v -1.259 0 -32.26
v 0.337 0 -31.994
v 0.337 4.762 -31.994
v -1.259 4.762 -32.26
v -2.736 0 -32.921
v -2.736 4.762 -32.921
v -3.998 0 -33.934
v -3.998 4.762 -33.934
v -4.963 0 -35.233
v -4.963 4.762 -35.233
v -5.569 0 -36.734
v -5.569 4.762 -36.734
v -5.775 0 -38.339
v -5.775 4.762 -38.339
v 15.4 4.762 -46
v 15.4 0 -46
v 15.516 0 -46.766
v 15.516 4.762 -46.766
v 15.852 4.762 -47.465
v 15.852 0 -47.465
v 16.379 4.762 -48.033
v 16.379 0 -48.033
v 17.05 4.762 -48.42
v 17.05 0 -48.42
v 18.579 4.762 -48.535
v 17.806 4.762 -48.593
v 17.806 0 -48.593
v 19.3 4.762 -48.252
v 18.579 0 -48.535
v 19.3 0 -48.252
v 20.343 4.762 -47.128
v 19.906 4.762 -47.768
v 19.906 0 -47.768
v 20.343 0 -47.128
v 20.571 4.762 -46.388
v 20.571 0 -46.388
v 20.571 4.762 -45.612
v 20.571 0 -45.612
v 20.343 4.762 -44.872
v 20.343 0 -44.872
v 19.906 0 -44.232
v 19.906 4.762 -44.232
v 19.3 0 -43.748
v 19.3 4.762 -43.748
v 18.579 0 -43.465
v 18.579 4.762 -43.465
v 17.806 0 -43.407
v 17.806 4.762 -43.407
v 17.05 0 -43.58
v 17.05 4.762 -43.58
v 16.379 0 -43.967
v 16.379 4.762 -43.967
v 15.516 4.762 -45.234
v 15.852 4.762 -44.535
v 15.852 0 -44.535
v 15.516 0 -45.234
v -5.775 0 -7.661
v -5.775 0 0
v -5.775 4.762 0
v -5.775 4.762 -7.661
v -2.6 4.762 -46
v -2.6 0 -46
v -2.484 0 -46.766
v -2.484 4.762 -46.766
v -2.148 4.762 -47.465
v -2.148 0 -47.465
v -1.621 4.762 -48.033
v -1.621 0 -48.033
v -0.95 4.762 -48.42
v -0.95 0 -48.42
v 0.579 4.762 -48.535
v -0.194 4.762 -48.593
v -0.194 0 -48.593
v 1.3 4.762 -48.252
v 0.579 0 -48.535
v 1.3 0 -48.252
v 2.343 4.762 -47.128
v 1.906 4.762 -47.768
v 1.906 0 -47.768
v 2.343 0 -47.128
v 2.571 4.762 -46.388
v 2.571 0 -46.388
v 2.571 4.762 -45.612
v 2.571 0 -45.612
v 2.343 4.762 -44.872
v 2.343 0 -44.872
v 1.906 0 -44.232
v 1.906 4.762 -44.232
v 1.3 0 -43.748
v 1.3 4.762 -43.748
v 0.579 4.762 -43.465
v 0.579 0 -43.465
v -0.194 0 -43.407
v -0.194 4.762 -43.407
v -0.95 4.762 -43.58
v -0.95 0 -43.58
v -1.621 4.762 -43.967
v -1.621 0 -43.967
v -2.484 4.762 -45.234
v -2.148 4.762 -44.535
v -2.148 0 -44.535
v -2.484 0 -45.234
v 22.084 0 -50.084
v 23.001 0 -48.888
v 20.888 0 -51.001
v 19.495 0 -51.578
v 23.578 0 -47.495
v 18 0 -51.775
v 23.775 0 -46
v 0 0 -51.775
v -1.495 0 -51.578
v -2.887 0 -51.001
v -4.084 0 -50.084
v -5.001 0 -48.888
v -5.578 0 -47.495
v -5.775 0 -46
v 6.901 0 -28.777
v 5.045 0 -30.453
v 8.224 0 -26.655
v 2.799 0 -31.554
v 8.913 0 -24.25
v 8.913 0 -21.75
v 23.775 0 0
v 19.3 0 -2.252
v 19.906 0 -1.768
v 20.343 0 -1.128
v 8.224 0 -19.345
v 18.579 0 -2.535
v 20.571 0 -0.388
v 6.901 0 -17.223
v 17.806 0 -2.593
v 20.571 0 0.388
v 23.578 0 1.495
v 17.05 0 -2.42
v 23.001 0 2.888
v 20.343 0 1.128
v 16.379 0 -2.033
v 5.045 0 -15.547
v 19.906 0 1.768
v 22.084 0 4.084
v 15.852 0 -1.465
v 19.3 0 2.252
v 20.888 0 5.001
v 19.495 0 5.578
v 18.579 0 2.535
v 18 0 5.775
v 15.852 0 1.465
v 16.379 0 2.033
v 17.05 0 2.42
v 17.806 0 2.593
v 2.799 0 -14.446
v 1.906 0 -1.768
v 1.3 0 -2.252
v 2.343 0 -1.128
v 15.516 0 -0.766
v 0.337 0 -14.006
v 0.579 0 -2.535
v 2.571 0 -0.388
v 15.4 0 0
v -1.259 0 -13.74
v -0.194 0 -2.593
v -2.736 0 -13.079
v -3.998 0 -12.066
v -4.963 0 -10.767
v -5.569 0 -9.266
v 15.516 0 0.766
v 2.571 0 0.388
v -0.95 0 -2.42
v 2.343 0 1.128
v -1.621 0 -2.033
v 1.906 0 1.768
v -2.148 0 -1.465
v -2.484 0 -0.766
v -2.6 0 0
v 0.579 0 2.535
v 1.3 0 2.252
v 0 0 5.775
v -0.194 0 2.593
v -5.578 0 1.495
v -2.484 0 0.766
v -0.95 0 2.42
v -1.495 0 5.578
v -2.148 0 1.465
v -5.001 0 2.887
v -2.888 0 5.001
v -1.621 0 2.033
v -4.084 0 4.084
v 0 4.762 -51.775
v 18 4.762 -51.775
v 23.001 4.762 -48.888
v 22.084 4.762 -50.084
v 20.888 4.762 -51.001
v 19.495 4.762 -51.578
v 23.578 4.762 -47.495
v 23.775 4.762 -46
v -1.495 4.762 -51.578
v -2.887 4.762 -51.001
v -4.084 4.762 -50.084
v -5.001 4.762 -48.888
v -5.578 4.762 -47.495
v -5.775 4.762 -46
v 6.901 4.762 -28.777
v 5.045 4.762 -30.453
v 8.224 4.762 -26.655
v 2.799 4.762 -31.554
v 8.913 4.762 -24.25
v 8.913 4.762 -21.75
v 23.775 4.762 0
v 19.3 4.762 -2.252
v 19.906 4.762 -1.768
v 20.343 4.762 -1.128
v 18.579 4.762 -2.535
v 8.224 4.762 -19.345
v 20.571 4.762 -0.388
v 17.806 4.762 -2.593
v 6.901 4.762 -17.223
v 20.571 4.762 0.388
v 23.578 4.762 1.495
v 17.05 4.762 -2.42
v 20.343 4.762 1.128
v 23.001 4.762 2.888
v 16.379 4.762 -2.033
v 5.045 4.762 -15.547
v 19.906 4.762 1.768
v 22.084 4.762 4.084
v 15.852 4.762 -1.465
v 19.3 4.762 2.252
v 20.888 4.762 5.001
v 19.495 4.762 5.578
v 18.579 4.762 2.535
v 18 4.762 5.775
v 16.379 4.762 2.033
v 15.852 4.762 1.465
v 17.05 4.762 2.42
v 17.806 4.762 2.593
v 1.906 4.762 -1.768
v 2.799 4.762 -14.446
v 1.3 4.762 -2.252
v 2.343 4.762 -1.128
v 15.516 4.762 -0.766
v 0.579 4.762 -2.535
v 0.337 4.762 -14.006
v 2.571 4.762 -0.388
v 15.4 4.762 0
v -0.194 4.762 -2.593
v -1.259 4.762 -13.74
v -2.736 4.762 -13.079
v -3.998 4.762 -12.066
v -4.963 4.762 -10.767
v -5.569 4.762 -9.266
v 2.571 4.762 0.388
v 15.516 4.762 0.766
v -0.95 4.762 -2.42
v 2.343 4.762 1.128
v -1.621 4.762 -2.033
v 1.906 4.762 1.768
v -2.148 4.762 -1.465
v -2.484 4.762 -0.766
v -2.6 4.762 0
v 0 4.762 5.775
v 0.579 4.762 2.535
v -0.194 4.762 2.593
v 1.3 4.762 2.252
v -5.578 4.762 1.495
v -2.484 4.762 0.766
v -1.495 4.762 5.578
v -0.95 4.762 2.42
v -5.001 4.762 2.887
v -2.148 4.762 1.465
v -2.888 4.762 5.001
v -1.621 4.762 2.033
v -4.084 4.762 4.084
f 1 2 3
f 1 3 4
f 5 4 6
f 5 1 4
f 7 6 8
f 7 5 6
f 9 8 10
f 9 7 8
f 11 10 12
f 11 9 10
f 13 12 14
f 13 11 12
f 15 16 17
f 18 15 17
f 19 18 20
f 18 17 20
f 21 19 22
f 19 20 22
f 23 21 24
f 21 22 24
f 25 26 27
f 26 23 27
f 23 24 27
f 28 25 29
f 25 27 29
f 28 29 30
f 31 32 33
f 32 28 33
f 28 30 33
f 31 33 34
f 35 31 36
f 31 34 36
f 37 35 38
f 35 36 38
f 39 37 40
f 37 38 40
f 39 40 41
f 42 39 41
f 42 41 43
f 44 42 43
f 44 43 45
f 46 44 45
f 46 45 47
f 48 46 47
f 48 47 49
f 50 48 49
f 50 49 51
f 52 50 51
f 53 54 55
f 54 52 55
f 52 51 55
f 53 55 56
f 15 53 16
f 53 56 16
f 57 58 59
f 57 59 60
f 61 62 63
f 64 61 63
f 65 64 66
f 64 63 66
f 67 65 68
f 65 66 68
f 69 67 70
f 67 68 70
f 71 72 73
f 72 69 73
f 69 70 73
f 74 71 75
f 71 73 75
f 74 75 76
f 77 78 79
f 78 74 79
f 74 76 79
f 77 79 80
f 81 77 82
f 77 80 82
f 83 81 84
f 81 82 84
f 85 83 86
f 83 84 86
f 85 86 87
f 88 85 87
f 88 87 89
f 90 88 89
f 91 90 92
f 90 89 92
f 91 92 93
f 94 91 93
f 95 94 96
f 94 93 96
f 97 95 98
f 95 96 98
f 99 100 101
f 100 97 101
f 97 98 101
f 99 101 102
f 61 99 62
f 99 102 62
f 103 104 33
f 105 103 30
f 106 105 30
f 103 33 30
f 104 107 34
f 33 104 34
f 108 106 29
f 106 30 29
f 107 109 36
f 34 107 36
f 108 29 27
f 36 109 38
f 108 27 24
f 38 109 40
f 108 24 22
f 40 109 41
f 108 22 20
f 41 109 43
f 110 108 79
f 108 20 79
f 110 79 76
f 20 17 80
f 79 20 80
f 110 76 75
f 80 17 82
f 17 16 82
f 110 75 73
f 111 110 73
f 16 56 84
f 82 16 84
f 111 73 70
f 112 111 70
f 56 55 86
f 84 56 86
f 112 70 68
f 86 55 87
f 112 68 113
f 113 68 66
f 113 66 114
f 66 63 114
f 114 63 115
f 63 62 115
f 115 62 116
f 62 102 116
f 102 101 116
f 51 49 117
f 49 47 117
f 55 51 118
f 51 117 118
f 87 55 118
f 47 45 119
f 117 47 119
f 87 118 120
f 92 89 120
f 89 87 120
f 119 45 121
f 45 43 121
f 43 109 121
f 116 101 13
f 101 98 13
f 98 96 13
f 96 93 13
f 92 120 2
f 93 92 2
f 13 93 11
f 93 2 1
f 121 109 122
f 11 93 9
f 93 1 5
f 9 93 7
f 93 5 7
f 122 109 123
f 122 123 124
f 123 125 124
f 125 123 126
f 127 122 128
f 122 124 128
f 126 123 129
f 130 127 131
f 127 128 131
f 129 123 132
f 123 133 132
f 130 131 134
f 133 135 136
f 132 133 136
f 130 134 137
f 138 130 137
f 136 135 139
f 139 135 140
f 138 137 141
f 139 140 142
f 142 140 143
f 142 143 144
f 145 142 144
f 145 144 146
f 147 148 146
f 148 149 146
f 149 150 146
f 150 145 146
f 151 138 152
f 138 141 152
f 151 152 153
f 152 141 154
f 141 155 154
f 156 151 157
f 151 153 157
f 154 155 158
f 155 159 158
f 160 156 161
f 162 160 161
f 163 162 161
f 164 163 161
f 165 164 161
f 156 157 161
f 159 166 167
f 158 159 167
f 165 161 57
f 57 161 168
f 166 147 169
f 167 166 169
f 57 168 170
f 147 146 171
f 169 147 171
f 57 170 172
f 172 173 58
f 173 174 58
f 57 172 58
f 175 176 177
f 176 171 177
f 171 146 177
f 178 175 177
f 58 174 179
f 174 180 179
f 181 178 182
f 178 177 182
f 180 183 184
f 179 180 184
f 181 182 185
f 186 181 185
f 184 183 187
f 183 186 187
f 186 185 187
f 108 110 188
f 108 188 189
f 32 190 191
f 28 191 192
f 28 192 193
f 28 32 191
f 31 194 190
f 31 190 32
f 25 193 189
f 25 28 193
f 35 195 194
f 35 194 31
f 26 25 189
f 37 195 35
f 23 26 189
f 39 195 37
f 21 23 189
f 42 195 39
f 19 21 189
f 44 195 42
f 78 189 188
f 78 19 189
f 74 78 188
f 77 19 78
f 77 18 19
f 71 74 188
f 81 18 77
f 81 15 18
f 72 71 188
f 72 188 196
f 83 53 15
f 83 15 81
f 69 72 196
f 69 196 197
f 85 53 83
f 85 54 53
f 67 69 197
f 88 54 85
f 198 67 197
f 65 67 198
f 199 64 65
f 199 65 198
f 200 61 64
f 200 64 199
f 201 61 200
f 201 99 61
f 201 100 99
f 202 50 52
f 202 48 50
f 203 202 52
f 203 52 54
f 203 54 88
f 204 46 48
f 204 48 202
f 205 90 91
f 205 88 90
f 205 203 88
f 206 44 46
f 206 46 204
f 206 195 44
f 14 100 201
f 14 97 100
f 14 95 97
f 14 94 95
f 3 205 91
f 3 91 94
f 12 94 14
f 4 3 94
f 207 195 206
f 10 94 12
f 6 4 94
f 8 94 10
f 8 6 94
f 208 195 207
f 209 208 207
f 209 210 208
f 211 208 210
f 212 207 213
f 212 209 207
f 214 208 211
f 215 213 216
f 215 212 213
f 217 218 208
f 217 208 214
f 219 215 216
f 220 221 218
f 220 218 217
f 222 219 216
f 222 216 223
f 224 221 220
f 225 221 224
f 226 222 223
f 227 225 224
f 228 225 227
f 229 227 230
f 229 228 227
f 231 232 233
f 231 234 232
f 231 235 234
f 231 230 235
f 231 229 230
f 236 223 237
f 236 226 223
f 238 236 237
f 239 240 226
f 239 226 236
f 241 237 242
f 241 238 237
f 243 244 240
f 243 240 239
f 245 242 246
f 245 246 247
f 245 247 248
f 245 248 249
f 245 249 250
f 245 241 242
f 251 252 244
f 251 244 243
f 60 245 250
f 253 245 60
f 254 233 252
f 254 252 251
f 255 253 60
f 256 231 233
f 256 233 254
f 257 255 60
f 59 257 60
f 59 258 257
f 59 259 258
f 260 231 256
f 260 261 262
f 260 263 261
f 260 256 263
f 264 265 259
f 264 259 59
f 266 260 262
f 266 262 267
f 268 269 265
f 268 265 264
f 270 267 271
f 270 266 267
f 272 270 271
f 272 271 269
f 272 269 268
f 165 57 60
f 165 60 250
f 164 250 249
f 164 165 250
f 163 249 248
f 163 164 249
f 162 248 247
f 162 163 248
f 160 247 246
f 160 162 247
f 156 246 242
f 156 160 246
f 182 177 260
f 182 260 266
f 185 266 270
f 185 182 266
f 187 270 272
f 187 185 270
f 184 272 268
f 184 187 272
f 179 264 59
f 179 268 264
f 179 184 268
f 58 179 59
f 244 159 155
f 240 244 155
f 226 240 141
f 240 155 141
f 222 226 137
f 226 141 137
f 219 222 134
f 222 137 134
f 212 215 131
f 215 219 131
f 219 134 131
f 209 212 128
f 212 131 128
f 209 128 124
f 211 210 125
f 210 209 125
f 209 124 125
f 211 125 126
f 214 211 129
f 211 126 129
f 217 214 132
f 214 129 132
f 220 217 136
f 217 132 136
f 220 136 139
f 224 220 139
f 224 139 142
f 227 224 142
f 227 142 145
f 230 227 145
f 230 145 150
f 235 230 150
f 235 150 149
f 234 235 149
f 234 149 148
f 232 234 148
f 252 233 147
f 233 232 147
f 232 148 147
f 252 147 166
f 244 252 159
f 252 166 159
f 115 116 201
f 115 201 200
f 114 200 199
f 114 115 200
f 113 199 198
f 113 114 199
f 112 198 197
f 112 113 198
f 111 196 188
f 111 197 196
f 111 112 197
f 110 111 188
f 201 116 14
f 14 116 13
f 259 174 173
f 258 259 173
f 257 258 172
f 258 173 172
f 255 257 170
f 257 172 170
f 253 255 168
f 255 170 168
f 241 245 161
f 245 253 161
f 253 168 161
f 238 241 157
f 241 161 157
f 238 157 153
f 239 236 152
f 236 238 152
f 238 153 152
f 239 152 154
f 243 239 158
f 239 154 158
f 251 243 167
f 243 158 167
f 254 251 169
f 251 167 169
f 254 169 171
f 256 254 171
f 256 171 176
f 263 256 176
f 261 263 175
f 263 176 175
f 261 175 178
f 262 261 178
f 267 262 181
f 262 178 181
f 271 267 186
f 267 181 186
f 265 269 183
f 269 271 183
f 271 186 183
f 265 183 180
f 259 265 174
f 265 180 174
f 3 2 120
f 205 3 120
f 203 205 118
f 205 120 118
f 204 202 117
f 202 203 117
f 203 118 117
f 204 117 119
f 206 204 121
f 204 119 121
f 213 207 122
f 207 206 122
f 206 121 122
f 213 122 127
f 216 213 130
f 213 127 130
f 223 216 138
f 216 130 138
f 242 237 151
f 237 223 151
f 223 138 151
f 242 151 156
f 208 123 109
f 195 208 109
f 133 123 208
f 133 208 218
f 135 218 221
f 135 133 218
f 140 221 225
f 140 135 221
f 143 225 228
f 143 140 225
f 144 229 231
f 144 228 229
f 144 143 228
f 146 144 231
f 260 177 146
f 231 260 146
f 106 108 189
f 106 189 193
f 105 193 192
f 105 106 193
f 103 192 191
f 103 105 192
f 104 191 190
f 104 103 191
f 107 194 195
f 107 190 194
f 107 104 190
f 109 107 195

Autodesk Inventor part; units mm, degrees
ref_plane "YZ Plane" through (0, 0, 0) normal (1, 0, 0) x (0, 1, 0)
ref_plane "XZ Plane" through (0, 0, 0) normal (0, 1, 0) x (-1, 0, 0)
ref_plane "XY Plane" through (0, 0, 0) normal (0, 0, 1) x (1, 0, 0)
sketch "Sketch1" plane through (0, 0, 0) normal (0, 1, 0) x (-1, 0, 0)
  circle A0 centre (0, 0) radius 2.6
  circle A1 centre (-18, 0) radius 2.6
  circle A2 centre (0, -46) radius 2.6
  circle A3 centre (-18, -46) radius 2.6
  circle A4 centre (0, -23) radius 9 construction
  circle A5 centre (0, 0) radius 5.775 construction
  circle A6 centre (0, -46) radius 5.775 construction
  circle A7 centre (-18, -46) radius 5.775 construction
  circle A8 centre (-18, 0) radius 5.775 construction
  line L0 (5.775, 0) -> (5.775, -7.6608)
  line L1 (5.775, -46) -> (5.775, -38.3392)
  arc A9 (5.775, -38.3392) -> (-0.3371, -31.9937) centre (-0.575, -38.3392) ccw
  arc A10 (-0.3371, -14.0063) -> (5.775, -7.6608) centre (-0.575, -7.6608) ccw
  arc A11 (-0.3371, -14.0063) -> (-0.3371, -31.9937) centre (0, -23) ccw
  line L2 (-23.775, 0) -> (-23.775, -46)
  line L3 (0, -51.775) -> (-18, -51.775)
  line L4 (0, 5.775) -> (-18, 5.775)
  arc A12 (5.775, 0) -> (0, 5.775) centre (0, 0) ccw
  arc A13 (-18, 5.775) -> (-23.775, 0) centre (-18, 0) ccw
  arc A14 (0, -51.775) -> (5.775, -46) centre (0, -46) ccw
  arc A15 (-23.775, -46) -> (-18, -51.775) centre (-18, -46) ccw
  dimension "d0" = 5.2
  dimension "d1" = 18
  dimension "d2" = 46
  dimension "d3" = 18
  dimension "d4" = 23
  dimension "d5" = 3.175
  dimension "d6" = 6.35
extrude "Extrusion1" add sketch "Sketch1" along normal blind 4.7625
equation "\"d4\" = 0.5 * d2"
properties part number "CNC-002-ShimStructureGusset2" material "ABS Plastic"
